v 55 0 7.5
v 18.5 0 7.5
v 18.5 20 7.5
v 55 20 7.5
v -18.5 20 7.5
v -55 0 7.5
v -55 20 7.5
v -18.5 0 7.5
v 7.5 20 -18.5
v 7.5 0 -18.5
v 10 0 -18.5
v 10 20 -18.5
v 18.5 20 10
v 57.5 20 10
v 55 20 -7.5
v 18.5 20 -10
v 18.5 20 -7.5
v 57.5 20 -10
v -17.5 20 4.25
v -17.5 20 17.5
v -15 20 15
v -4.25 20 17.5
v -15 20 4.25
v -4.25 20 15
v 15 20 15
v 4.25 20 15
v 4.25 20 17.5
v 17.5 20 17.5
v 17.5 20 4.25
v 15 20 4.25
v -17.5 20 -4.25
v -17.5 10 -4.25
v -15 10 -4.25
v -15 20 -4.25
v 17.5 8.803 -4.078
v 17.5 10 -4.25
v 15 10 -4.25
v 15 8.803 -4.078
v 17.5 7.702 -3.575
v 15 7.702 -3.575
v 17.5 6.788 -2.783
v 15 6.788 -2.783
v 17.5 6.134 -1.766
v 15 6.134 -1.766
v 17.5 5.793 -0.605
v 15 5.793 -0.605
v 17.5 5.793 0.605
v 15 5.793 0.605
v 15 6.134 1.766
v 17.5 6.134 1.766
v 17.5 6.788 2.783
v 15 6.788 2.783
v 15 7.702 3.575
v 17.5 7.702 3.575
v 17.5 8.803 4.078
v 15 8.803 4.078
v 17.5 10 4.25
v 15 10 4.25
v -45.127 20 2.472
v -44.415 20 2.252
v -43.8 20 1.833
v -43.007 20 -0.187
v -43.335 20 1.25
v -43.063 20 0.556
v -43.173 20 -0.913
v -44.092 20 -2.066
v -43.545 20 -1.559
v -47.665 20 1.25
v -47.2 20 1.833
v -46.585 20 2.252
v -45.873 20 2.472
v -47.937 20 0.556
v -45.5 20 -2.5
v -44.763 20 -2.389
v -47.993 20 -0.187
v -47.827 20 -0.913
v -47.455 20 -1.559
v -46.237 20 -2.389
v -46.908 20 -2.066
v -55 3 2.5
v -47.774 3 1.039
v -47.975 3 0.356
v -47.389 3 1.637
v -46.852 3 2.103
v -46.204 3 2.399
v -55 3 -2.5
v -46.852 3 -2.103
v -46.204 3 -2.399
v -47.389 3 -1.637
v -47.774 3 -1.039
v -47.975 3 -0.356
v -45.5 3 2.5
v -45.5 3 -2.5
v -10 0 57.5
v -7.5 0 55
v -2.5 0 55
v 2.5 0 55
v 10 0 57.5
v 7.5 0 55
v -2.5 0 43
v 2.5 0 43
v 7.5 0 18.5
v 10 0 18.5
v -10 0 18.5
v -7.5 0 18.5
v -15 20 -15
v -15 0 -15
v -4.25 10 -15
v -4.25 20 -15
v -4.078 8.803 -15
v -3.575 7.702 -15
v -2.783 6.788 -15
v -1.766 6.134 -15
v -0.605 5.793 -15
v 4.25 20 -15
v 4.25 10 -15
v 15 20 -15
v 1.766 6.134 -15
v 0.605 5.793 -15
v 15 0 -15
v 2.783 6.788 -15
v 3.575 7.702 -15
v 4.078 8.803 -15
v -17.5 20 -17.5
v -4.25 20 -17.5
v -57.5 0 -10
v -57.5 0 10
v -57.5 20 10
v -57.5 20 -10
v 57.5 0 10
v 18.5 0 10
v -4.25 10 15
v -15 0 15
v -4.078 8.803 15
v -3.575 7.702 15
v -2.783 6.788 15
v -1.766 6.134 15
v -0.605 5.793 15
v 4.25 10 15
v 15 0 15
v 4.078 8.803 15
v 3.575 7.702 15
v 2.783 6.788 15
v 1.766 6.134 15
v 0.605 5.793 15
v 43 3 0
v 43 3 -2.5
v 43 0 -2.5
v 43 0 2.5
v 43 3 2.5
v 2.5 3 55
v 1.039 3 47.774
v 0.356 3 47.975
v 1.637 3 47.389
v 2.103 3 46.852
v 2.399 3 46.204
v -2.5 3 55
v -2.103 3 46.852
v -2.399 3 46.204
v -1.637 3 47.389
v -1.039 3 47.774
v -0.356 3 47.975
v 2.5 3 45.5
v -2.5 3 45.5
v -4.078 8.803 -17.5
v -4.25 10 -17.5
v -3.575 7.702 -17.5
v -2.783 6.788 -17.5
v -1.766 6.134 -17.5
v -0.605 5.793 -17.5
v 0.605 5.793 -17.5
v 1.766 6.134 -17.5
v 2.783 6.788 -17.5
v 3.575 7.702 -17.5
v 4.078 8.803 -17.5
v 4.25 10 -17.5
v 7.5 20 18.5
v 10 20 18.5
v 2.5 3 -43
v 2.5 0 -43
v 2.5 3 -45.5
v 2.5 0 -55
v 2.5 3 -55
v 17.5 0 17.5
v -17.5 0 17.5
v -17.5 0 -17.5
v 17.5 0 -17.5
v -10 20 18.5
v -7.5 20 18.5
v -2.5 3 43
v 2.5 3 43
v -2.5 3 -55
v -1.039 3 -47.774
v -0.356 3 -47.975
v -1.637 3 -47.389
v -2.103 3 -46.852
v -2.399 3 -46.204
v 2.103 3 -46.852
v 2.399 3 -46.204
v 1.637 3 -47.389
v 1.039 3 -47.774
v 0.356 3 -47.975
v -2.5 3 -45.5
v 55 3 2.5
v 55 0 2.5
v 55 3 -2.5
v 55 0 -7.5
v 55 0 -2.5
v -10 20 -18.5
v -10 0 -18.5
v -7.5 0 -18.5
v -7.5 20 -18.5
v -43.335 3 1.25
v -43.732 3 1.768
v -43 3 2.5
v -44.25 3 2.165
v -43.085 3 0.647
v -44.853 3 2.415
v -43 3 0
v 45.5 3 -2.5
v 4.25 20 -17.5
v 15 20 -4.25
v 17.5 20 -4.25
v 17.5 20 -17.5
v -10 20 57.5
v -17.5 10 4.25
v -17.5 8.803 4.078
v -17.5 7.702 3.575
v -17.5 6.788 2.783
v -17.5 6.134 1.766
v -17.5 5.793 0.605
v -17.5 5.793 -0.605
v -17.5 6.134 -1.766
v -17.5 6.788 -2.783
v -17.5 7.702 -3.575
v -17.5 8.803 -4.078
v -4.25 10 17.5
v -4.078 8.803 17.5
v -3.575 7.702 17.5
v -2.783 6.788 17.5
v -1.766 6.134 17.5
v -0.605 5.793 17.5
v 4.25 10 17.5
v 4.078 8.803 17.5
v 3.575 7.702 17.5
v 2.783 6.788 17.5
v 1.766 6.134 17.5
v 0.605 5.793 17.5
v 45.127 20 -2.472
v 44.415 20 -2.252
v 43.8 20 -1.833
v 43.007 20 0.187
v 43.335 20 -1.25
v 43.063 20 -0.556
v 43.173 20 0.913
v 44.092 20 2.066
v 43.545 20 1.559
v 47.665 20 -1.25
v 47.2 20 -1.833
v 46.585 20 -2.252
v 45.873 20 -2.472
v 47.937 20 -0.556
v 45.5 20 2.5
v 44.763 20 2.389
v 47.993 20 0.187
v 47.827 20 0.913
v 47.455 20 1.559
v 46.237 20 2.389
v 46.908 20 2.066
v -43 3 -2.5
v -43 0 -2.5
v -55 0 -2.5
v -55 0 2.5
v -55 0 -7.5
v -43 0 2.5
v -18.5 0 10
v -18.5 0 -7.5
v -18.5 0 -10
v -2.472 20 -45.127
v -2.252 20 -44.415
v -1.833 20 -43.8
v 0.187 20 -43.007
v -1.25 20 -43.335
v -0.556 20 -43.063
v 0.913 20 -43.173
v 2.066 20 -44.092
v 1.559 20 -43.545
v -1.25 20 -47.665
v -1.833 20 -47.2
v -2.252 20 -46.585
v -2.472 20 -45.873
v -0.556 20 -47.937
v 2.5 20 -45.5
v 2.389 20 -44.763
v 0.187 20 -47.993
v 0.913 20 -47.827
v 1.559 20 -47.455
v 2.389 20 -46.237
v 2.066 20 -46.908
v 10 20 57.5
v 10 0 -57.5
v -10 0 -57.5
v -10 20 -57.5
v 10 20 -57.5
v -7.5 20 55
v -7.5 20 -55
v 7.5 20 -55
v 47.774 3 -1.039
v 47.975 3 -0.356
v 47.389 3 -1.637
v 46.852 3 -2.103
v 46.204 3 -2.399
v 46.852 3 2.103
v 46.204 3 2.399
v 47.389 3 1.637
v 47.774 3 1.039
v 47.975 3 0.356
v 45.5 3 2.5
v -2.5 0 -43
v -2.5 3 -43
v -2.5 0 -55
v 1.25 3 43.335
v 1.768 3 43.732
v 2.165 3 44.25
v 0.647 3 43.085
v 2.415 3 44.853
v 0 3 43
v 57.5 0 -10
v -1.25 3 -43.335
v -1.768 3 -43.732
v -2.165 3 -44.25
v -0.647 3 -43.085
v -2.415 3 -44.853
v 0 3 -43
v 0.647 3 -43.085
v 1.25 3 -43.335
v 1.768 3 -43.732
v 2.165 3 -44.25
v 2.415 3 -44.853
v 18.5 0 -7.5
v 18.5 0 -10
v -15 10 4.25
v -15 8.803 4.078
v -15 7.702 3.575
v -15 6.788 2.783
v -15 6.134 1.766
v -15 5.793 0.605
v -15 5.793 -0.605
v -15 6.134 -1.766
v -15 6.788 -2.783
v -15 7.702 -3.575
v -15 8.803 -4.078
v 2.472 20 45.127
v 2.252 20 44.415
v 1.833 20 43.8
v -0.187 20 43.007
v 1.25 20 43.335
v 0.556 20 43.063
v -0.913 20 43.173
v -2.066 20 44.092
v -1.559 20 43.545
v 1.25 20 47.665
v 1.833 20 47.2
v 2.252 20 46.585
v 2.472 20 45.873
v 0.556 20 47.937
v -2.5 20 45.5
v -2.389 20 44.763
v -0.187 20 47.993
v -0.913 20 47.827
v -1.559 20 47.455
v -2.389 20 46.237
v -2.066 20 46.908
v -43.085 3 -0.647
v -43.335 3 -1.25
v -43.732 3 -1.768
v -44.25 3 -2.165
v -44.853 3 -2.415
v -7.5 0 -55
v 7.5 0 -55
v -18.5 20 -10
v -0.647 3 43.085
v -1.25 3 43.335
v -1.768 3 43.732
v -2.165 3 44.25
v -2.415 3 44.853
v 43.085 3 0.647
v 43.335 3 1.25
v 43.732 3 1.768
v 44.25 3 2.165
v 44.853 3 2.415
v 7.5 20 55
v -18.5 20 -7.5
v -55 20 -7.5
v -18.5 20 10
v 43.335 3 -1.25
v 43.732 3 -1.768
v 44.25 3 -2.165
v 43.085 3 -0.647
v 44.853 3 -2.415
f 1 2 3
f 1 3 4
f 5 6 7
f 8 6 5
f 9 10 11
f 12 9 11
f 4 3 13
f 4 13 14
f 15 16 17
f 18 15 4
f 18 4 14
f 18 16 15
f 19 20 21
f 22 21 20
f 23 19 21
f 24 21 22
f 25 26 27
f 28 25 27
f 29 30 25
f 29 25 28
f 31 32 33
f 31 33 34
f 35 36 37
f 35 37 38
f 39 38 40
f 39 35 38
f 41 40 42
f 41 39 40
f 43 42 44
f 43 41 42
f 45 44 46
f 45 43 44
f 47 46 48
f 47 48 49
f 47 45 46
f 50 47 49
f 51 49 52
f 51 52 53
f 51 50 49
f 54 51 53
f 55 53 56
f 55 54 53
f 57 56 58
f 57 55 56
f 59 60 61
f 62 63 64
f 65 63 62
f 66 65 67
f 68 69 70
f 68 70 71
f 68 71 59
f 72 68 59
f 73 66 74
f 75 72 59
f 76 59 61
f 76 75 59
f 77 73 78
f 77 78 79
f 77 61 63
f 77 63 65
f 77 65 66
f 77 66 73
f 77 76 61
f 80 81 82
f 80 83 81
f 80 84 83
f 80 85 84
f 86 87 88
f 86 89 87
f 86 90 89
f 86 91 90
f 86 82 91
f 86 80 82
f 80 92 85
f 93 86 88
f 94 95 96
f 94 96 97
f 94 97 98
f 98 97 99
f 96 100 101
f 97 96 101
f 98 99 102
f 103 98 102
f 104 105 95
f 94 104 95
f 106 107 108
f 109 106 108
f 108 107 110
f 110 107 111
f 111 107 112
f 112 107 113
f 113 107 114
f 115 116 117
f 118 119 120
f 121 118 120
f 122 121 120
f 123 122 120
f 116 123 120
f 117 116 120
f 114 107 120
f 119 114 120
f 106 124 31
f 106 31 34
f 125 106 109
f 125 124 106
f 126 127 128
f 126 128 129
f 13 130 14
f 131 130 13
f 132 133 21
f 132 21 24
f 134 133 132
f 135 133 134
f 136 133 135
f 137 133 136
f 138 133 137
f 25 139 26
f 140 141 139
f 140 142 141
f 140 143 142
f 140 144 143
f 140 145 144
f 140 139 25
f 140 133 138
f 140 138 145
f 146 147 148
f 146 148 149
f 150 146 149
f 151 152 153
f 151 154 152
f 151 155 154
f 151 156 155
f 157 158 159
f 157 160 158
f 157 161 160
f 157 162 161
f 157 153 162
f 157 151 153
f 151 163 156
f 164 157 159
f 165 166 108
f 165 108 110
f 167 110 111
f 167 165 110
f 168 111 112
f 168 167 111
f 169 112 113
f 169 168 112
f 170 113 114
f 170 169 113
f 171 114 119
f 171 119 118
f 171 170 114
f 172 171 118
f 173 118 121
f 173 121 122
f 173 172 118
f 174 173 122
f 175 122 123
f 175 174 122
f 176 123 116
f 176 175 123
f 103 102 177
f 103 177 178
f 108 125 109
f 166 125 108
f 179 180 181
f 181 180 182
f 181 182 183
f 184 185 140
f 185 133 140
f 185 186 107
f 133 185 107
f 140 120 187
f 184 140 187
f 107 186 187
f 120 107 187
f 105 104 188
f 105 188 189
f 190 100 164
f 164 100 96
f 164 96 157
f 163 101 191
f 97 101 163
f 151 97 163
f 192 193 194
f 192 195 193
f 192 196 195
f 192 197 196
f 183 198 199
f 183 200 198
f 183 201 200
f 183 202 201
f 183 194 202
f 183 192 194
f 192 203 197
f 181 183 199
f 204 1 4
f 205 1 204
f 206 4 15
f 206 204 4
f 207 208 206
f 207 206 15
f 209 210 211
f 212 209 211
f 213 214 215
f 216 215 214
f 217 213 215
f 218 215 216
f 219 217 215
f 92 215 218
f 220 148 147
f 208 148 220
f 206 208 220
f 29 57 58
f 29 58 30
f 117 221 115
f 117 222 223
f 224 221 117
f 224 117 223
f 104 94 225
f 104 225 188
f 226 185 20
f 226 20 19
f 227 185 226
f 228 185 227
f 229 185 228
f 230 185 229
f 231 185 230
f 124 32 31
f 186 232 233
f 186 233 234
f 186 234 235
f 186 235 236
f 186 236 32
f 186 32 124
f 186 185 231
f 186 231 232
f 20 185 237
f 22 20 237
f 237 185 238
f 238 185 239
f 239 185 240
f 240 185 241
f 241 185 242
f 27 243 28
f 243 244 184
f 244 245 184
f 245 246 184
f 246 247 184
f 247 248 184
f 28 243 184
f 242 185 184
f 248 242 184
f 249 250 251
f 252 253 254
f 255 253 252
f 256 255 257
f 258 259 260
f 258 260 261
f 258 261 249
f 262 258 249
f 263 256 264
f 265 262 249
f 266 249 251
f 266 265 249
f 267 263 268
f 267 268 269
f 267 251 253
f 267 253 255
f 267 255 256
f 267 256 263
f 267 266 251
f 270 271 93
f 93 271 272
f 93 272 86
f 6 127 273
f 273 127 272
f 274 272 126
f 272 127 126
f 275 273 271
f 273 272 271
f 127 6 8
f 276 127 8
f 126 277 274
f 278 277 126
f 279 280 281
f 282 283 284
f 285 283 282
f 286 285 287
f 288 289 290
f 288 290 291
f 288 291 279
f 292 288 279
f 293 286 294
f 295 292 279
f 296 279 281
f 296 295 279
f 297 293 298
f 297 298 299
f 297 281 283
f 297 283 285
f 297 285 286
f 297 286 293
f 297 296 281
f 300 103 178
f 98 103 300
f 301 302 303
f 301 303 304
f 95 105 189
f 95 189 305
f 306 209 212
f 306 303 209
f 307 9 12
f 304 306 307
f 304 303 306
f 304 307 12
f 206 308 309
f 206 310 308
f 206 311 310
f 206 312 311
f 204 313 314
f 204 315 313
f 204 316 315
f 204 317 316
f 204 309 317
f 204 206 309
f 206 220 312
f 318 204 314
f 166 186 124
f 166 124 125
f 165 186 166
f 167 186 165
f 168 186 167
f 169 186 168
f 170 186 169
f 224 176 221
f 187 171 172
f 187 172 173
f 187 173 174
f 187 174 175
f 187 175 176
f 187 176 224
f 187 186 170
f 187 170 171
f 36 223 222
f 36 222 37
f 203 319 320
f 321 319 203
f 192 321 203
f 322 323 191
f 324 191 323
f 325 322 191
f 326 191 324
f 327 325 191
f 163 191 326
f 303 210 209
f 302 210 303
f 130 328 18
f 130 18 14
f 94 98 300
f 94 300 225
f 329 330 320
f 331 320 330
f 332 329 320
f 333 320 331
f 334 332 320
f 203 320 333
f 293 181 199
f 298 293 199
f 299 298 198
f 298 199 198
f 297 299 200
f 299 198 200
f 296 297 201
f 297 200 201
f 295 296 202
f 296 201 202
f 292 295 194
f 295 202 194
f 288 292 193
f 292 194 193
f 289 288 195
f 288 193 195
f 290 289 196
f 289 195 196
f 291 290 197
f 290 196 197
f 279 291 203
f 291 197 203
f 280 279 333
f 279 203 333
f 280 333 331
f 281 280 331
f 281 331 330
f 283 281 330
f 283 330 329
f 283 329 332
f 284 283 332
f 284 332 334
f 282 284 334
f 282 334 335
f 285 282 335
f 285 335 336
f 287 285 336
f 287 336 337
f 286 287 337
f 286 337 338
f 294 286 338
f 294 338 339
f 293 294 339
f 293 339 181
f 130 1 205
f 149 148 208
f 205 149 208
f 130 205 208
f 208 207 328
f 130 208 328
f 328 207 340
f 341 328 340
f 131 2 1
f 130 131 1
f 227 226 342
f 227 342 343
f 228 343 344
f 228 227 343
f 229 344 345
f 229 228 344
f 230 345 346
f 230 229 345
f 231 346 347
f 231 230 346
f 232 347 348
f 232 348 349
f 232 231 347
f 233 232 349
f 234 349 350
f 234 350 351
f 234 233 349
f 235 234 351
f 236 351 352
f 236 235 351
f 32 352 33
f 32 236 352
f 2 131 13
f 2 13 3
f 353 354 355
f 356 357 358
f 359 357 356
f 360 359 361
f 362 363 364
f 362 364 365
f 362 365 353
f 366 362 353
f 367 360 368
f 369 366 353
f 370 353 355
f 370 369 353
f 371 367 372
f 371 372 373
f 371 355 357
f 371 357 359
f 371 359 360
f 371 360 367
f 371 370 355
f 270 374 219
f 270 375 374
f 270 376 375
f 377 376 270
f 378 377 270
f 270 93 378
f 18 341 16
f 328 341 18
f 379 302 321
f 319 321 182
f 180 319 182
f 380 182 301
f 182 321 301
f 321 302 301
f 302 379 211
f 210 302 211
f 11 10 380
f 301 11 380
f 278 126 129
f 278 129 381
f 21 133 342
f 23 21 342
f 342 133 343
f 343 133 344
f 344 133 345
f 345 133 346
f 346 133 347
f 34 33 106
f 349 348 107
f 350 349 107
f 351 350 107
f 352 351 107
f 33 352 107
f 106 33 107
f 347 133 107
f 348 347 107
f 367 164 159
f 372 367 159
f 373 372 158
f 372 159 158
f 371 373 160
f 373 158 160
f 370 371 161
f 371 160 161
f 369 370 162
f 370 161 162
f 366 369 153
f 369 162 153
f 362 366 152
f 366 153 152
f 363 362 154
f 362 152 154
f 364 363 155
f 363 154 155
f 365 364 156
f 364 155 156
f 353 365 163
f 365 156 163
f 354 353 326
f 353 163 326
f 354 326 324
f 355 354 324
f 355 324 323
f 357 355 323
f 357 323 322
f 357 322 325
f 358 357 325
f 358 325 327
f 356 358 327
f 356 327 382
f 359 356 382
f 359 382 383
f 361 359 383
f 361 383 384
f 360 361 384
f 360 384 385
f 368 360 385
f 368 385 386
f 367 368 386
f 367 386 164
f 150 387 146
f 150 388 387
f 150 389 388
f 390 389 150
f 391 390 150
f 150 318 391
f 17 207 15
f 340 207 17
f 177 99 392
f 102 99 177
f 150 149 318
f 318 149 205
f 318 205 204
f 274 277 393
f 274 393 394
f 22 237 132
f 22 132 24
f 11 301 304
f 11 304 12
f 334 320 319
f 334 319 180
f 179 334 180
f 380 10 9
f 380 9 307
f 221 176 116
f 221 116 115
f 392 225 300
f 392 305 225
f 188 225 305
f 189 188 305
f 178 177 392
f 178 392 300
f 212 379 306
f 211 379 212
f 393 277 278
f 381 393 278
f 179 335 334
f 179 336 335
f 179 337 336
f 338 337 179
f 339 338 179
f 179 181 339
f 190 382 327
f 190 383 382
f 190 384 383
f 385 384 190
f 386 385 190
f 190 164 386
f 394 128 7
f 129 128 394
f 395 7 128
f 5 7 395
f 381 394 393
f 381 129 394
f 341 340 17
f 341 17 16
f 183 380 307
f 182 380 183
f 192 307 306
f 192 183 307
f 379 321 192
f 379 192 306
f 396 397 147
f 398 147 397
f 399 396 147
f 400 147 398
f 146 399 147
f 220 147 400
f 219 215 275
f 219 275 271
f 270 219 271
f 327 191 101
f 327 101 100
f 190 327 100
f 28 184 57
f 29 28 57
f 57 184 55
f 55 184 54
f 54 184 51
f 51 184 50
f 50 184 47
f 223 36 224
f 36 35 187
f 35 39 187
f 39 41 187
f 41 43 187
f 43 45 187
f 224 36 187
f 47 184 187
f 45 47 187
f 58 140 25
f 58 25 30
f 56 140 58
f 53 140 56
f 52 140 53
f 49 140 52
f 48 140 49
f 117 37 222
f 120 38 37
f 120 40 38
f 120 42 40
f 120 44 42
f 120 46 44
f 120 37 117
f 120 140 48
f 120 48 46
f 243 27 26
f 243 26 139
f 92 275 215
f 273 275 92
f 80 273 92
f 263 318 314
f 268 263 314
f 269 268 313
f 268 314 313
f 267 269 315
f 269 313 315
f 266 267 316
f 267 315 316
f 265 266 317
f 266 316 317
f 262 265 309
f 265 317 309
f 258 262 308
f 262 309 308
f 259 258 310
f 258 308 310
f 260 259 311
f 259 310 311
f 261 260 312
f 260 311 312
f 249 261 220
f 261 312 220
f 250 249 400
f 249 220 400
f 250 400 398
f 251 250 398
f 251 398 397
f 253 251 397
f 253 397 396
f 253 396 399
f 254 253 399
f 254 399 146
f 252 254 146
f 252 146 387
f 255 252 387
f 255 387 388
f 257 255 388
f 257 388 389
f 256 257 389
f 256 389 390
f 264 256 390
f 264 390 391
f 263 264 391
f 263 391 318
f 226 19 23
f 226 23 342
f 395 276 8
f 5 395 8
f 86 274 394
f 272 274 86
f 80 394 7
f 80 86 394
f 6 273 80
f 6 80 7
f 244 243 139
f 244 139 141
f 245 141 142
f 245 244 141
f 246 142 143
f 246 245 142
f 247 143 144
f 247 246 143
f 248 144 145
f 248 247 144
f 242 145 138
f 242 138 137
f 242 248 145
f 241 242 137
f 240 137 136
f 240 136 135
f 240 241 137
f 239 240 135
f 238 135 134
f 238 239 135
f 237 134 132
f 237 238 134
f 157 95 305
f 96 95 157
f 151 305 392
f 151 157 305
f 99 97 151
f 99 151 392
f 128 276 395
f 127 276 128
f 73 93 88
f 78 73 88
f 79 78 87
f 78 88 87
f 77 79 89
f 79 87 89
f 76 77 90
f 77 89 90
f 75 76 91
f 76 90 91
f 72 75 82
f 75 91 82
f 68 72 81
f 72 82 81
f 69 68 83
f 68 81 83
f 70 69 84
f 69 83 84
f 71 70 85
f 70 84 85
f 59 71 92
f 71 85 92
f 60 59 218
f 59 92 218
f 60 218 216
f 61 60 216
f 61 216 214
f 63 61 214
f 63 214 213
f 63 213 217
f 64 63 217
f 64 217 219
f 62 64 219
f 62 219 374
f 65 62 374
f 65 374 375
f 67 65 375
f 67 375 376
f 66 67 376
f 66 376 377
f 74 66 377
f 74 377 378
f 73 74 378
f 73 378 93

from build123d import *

# Parameters (mm, degrees)
SKETCH1_W           = 35
SKETCH1_H           = 35
SKETCH1_W_2         = 30
SKETCH1_H_2         = 30
BOSS_EXTRUDE1_DEPTH = 20
CUT_EXTRUDE1_DEPTH  = 2.5
CIRPATTERN1_COUNT   = 4
BOSS_EXTRUDE2_DEPTH = 20
SKETCH6_W           = 5
SKETCH6_H           = 3
BOSS_EXTRUDE3_DEPTH = 12
SKETCH7_R           = 2.5
BOSS_EXTRUDE4_DEPTH = 17
CIRPATTERN6_COUNT   = 4
SKETCH8_W           = 2.5
SKETCH8_H           = 1
SKETCH8_W_2         = 1
SKETCH8_H_2         = 2.5
CUT_EXTRUDE4_DEPTH  = 21


with BuildPart() as part:
    # Sketch1 → Boss-Extrude1 (new body)
    with BuildSketch(Plane(origin=(0, 0, 0), x_dir=(1, 0, 0), z_dir=(0, 1, 0))):
        Rectangle(SKETCH1_W, SKETCH1_H)
        Rectangle(SKETCH1_W_2, SKETCH1_H_2, mode=Mode.SUBTRACT)
    extrude(amount=BOSS_EXTRUDE1_DEPTH)

    # Sketch2 → Cut-Extrude1 (cut)
    with BuildSketch(Plane.ZY.offset(17.5)):
        with BuildLine():
            Line((-4.25, 10), (-4.25, 20))
            Line((-4.25, 20), (4.25, 20))
            Line((4.25, 20), (4.25, 10))
            ThreePointArc((4.25, 10), (0, 5.75), (-4.25, 10))
        make_face()
    cut_extrude1 = extrude(amount=-CUT_EXTRUDE1_DEPTH, mode=Mode.SUBTRACT)

    # CirPattern1: Cut-Extrude1 ×4 about axis
    cirpattern1_axis = Axis((0, 0, 0), (0, 1, 0))
    for i in range(1, CIRPATTERN1_COUNT):
        add(cut_extrude1.rotate(cirpattern1_axis, i * 360 / CIRPATTERN1_COUNT), mode=Mode.SUBTRACT)

    # Sketch5 → Boss-Extrude2 (add)
    with BuildSketch(Plane(origin=(0, 0, 0), x_dir=(1, 0, 0), z_dir=(0, 1, 0))):
        Polygon((7.5, 17.5), (7.5, 55), (-7.5, 55), (-7.5, 17.5), (-10, 17.5), (-10, 57.5), (10, 57.5), (10, 17.5), align=None)
    boss_extrude2 = extrude(amount=BOSS_EXTRUDE2_DEPTH)

    # Sketch6 → Boss-Extrude3 (add)
    with BuildSketch(Plane.XY.offset(-55)):
        with Locations((0, 1.5)):
            Rectangle(SKETCH6_W, SKETCH6_H)
    boss_extrude3 = extrude(amount=BOSS_EXTRUDE3_DEPTH)

    # Sketch7 → Boss-Extrude4 (add)
    with BuildSketch(Plane(origin=(0, 3, 0), x_dir=(1, 0, 0), z_dir=(0, 1, 0))):
        with Locations((0, 45.5)):
            Circle(SKETCH7_R)
    boss_extrude4 = extrude(amount=BOSS_EXTRUDE4_DEPTH)

    # CirPattern6: Boss-Extrude2, Boss-Extrude3, Boss-Extrude4 ×4 about axis
    cirpattern6_axis = Axis((0, 0, 0), (0, 1, 0))
    for i in range(1, CIRPATTERN6_COUNT):
        add(boss_extrude2.rotate(cirpattern6_axis, i * 360 / CIRPATTERN6_COUNT))
        add(boss_extrude3.rotate(cirpattern6_axis, i * 360 / CIRPATTERN6_COUNT))
        add(boss_extrude4.rotate(cirpattern6_axis, i * 360 / CIRPATTERN6_COUNT))

    # Sketch8 → Cut-Extrude4 (cut, through all)
    with BuildSketch(Plane(origin=(0, 20, 0), x_dir=(1, 0, 0), z_dir=(0, 1, 0))):
        with Locations((8.75, 18)):
            Rectangle(SKETCH8_W, SKETCH8_H)
        with Locations((-8.75, 18)):
            Rectangle(SKETCH8_W, SKETCH8_H)
        with Locations((18, -8.75)):
            Rectangle(SKETCH8_W_2, SKETCH8_H_2)
        with Locations((18, 8.75)):
            Rectangle(SKETCH8_W_2, SKETCH8_H_2)
        with Locations((-8.75, -18)):
            Rectangle(SKETCH8_W, SKETCH8_H)
        with Locations((8.75, -18)):
            Rectangle(SKETCH8_W, SKETCH8_H)
        with Locations((-18, 8.75)):
            Rectangle(SKETCH8_W_2, SKETCH8_H_2)
        with Locations((-18, -8.75)):
            Rectangle(SKETCH8_W_2, SKETCH8_H_2)
    extrude(amount=-CUT_EXTRUDE4_DEPTH, mode=Mode.SUBTRACT)


solid = part.part
